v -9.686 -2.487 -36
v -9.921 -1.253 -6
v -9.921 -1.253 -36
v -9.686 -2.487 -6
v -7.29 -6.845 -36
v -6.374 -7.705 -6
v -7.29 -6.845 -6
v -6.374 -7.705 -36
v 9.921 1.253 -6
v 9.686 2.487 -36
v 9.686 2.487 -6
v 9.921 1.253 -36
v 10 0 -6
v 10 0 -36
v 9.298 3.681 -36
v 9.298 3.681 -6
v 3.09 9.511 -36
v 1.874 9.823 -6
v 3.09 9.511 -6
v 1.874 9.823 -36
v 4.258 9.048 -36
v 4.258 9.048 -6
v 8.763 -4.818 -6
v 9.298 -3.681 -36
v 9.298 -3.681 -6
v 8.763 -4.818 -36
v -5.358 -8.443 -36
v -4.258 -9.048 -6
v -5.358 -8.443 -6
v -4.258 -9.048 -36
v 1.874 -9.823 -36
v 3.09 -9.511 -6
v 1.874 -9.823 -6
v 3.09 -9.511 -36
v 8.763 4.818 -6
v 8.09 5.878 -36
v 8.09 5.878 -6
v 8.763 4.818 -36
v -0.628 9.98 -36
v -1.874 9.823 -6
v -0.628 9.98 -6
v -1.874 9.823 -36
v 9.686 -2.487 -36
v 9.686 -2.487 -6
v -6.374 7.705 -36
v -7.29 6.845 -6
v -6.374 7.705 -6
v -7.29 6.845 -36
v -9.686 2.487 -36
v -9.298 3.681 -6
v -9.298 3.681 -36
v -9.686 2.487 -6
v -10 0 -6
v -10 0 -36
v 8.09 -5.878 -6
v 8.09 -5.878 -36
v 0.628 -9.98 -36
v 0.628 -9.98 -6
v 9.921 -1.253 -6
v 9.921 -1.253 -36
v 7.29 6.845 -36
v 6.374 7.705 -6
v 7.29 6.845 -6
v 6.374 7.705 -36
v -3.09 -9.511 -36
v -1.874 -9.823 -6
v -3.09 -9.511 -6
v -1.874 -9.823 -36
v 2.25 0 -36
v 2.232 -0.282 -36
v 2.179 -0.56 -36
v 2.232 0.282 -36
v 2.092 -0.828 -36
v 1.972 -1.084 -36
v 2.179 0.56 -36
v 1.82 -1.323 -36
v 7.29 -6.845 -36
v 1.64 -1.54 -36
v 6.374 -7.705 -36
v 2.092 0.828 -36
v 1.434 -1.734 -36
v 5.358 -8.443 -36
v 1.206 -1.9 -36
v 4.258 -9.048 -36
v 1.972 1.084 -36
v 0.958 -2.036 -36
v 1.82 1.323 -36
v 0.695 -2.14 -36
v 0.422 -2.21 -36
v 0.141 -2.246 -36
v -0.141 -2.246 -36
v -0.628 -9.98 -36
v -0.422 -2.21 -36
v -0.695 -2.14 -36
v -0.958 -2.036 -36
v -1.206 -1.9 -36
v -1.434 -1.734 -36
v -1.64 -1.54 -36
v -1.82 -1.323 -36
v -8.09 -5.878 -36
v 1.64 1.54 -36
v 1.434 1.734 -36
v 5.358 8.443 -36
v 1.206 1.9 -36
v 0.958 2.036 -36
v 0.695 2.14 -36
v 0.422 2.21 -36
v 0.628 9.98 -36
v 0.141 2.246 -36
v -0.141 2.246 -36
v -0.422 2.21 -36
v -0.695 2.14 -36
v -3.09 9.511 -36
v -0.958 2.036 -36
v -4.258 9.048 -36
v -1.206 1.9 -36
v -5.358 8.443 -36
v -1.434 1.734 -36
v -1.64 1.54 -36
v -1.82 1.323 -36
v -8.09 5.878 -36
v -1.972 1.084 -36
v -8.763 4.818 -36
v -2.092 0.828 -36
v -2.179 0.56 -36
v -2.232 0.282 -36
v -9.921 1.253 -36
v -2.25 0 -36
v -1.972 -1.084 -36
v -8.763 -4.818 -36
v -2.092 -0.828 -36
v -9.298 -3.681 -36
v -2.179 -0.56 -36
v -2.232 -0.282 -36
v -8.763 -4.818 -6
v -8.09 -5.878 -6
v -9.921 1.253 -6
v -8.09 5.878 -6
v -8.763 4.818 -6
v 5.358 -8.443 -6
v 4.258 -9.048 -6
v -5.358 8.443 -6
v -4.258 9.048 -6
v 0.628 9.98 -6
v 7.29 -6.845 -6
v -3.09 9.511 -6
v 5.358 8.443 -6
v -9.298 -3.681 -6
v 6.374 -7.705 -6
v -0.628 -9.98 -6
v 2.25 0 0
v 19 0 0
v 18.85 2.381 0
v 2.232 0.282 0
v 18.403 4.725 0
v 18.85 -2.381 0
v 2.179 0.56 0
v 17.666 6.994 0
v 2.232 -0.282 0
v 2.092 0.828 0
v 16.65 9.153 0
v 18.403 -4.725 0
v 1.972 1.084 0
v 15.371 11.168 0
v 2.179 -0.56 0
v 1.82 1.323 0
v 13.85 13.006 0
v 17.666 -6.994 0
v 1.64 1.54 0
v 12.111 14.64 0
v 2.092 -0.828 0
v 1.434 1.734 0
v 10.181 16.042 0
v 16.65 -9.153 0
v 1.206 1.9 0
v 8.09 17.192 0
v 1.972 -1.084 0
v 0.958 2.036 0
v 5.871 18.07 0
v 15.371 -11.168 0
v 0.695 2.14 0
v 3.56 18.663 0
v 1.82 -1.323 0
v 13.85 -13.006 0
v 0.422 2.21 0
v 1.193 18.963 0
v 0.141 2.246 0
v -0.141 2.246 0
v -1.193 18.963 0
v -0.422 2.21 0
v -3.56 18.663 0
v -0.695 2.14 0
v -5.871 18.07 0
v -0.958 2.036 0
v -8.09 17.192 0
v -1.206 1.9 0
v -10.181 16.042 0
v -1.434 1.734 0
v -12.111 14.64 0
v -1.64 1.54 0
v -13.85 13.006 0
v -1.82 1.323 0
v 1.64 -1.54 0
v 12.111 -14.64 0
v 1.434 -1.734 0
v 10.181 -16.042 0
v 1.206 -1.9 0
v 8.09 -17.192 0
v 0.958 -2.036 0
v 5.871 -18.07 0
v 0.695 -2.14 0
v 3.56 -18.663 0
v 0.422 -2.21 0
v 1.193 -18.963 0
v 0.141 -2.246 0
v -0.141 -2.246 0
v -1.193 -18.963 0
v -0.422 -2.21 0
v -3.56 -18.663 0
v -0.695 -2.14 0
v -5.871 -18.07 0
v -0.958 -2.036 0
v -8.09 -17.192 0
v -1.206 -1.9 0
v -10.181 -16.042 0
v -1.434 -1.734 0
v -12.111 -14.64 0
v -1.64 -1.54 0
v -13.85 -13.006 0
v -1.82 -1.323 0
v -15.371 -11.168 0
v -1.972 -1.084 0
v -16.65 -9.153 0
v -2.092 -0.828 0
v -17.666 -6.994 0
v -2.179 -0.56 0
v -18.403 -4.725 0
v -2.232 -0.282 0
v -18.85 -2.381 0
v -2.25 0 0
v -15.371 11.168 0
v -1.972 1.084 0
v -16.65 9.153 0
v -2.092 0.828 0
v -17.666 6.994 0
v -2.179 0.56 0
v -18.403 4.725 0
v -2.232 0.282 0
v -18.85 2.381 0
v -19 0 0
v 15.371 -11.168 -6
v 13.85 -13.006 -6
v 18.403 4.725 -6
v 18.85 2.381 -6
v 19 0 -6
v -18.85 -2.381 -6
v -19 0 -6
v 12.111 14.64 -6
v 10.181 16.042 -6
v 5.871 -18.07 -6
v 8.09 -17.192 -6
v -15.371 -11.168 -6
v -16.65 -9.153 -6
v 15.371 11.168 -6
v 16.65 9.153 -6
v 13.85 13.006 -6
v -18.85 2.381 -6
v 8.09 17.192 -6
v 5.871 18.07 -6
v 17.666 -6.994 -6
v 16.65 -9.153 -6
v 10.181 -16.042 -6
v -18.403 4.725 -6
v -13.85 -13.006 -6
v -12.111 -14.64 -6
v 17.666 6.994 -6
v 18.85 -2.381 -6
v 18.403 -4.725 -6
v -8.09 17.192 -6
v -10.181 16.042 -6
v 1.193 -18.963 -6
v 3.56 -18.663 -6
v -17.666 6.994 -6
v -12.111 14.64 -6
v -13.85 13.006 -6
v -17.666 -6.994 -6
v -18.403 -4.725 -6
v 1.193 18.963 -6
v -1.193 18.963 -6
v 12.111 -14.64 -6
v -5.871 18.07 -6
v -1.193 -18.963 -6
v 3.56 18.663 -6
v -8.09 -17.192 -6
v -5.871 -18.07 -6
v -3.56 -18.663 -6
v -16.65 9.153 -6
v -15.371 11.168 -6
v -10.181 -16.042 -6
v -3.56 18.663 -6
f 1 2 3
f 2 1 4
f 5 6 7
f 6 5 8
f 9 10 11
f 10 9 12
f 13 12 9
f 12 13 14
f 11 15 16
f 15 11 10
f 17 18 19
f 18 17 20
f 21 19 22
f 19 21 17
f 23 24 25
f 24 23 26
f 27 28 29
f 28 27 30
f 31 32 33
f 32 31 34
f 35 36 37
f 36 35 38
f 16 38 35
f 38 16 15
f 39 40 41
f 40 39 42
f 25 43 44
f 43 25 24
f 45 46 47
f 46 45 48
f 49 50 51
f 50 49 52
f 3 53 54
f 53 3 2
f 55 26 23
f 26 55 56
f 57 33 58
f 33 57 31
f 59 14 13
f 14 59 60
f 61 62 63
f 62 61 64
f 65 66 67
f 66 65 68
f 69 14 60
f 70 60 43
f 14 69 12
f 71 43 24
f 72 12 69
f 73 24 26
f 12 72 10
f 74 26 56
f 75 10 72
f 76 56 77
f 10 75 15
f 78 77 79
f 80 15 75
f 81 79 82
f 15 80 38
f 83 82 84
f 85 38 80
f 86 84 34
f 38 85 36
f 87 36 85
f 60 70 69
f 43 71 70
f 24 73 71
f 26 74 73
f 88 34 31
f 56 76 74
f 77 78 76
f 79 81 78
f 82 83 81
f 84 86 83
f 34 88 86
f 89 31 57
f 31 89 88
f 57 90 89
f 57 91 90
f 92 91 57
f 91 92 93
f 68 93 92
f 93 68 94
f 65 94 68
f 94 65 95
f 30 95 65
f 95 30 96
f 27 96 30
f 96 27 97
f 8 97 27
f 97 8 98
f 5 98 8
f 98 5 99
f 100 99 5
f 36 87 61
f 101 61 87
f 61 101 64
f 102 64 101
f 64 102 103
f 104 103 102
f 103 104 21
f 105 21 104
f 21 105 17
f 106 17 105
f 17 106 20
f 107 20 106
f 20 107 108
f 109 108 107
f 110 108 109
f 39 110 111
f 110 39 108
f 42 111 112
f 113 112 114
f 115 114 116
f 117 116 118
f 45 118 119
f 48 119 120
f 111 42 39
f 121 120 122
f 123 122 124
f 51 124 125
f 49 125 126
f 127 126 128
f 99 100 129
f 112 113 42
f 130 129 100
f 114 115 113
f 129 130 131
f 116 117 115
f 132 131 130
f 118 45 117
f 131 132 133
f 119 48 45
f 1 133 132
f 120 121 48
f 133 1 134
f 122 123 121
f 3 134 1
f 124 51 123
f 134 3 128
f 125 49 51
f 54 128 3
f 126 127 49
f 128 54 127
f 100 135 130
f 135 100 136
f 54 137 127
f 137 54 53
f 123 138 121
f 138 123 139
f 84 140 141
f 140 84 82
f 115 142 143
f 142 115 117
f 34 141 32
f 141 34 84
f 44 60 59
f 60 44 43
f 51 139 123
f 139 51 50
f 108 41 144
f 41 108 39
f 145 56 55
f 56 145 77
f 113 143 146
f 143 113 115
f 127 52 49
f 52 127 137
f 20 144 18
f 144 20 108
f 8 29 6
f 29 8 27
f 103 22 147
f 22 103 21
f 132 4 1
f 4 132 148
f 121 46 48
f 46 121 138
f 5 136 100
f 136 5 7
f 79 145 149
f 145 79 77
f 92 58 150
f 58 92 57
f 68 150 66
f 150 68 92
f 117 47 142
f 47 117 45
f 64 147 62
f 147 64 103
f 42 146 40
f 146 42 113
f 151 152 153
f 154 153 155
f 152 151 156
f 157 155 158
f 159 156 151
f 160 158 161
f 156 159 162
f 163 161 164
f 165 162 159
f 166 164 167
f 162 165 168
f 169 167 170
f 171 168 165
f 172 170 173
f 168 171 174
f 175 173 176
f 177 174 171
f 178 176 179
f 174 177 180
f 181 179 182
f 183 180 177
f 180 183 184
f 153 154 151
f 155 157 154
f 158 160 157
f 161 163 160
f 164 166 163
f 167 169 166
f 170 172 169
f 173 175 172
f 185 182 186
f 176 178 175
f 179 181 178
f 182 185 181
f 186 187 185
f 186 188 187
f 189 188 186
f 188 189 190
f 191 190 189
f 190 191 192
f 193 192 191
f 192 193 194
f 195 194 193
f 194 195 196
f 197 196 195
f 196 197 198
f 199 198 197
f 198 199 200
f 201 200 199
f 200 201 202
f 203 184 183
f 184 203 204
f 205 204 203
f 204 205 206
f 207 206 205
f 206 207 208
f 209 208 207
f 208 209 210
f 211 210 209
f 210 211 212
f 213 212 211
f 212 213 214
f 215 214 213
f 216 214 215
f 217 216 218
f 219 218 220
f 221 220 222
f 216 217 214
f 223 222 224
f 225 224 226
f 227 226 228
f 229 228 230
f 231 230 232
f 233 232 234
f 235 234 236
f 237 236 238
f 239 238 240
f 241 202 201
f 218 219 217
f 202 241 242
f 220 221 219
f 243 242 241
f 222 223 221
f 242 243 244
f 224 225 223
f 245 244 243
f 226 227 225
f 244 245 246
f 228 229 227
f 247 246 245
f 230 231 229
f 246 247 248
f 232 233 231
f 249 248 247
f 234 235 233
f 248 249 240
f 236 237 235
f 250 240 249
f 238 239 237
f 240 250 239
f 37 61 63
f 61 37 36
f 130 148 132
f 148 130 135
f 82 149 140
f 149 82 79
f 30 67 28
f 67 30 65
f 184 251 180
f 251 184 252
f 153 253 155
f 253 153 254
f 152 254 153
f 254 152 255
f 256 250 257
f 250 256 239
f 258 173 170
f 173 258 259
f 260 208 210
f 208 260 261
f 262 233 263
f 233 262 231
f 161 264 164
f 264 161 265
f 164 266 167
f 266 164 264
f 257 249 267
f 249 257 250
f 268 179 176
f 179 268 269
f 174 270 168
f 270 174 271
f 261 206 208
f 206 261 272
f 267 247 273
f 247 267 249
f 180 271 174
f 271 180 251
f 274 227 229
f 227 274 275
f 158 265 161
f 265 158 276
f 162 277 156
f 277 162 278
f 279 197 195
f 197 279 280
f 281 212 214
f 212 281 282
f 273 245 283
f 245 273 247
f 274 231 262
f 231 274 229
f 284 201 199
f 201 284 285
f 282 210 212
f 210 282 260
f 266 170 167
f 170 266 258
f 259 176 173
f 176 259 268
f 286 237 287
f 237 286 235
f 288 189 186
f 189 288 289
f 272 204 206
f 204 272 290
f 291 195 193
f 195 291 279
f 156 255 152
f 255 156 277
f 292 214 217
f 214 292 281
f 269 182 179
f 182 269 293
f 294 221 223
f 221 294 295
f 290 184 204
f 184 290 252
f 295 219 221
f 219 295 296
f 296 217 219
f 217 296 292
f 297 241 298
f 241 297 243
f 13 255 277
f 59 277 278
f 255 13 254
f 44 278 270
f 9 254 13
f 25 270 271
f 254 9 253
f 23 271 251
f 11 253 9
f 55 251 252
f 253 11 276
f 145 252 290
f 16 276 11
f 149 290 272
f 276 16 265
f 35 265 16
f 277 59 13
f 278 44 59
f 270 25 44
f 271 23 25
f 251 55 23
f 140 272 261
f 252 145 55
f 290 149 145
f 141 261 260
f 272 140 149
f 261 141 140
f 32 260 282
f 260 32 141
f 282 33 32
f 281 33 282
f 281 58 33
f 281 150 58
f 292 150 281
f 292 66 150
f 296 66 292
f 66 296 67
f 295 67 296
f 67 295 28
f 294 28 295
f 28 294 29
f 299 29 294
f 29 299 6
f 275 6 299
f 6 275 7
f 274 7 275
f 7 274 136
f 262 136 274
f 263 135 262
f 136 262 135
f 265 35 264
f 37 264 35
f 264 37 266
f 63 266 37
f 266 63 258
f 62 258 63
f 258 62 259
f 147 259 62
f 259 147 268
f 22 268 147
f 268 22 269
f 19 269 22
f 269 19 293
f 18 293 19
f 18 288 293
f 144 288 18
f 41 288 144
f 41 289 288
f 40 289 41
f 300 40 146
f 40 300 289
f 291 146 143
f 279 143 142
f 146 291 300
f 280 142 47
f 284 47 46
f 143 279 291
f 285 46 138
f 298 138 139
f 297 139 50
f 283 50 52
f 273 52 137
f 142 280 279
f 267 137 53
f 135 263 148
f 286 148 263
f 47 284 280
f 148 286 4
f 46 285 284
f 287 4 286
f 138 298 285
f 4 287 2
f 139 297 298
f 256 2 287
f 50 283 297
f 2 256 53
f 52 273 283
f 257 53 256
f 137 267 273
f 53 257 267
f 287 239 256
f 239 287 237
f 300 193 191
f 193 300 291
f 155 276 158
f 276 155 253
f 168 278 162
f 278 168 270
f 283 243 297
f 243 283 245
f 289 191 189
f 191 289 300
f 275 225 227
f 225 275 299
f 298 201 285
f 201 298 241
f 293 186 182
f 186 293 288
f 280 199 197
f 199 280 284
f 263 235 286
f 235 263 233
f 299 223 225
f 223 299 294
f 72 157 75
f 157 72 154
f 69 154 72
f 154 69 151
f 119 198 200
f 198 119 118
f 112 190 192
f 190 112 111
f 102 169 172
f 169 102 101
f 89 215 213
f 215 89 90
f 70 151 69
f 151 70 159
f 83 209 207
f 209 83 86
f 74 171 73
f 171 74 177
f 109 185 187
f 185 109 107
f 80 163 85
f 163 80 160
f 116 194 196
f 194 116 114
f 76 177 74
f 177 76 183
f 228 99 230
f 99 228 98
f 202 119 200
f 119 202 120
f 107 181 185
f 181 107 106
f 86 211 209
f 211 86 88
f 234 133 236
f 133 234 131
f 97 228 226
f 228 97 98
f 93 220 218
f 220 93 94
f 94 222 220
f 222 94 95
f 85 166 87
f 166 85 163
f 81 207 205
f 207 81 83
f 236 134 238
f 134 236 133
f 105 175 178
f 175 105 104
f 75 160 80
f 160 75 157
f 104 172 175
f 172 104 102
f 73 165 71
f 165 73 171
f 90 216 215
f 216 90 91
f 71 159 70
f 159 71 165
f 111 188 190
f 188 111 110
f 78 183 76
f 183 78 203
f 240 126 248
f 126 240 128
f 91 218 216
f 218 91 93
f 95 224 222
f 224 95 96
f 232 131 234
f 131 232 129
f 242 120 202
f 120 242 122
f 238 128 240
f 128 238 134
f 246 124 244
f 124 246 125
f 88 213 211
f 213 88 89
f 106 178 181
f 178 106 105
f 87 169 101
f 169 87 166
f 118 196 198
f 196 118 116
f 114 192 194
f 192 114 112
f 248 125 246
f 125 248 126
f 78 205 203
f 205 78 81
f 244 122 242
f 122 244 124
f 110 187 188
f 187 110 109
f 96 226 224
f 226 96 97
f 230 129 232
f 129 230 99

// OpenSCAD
$fn = 50;


difference() {
	union() {
		translate(v = [0, 0, -36.0000000000]) {
			cylinder(h = 36, r = 10.0000000000);
		}
		translate(v = [0, 0, -6.0000000000]) {
			cylinder(h = 6, r = 19.0000000000);
		}
	}
	union() {
		#translate(v = [0, 0, -36]) {
			cylinder(h = 36, r = 2.2500000000);
		}
	}
}
